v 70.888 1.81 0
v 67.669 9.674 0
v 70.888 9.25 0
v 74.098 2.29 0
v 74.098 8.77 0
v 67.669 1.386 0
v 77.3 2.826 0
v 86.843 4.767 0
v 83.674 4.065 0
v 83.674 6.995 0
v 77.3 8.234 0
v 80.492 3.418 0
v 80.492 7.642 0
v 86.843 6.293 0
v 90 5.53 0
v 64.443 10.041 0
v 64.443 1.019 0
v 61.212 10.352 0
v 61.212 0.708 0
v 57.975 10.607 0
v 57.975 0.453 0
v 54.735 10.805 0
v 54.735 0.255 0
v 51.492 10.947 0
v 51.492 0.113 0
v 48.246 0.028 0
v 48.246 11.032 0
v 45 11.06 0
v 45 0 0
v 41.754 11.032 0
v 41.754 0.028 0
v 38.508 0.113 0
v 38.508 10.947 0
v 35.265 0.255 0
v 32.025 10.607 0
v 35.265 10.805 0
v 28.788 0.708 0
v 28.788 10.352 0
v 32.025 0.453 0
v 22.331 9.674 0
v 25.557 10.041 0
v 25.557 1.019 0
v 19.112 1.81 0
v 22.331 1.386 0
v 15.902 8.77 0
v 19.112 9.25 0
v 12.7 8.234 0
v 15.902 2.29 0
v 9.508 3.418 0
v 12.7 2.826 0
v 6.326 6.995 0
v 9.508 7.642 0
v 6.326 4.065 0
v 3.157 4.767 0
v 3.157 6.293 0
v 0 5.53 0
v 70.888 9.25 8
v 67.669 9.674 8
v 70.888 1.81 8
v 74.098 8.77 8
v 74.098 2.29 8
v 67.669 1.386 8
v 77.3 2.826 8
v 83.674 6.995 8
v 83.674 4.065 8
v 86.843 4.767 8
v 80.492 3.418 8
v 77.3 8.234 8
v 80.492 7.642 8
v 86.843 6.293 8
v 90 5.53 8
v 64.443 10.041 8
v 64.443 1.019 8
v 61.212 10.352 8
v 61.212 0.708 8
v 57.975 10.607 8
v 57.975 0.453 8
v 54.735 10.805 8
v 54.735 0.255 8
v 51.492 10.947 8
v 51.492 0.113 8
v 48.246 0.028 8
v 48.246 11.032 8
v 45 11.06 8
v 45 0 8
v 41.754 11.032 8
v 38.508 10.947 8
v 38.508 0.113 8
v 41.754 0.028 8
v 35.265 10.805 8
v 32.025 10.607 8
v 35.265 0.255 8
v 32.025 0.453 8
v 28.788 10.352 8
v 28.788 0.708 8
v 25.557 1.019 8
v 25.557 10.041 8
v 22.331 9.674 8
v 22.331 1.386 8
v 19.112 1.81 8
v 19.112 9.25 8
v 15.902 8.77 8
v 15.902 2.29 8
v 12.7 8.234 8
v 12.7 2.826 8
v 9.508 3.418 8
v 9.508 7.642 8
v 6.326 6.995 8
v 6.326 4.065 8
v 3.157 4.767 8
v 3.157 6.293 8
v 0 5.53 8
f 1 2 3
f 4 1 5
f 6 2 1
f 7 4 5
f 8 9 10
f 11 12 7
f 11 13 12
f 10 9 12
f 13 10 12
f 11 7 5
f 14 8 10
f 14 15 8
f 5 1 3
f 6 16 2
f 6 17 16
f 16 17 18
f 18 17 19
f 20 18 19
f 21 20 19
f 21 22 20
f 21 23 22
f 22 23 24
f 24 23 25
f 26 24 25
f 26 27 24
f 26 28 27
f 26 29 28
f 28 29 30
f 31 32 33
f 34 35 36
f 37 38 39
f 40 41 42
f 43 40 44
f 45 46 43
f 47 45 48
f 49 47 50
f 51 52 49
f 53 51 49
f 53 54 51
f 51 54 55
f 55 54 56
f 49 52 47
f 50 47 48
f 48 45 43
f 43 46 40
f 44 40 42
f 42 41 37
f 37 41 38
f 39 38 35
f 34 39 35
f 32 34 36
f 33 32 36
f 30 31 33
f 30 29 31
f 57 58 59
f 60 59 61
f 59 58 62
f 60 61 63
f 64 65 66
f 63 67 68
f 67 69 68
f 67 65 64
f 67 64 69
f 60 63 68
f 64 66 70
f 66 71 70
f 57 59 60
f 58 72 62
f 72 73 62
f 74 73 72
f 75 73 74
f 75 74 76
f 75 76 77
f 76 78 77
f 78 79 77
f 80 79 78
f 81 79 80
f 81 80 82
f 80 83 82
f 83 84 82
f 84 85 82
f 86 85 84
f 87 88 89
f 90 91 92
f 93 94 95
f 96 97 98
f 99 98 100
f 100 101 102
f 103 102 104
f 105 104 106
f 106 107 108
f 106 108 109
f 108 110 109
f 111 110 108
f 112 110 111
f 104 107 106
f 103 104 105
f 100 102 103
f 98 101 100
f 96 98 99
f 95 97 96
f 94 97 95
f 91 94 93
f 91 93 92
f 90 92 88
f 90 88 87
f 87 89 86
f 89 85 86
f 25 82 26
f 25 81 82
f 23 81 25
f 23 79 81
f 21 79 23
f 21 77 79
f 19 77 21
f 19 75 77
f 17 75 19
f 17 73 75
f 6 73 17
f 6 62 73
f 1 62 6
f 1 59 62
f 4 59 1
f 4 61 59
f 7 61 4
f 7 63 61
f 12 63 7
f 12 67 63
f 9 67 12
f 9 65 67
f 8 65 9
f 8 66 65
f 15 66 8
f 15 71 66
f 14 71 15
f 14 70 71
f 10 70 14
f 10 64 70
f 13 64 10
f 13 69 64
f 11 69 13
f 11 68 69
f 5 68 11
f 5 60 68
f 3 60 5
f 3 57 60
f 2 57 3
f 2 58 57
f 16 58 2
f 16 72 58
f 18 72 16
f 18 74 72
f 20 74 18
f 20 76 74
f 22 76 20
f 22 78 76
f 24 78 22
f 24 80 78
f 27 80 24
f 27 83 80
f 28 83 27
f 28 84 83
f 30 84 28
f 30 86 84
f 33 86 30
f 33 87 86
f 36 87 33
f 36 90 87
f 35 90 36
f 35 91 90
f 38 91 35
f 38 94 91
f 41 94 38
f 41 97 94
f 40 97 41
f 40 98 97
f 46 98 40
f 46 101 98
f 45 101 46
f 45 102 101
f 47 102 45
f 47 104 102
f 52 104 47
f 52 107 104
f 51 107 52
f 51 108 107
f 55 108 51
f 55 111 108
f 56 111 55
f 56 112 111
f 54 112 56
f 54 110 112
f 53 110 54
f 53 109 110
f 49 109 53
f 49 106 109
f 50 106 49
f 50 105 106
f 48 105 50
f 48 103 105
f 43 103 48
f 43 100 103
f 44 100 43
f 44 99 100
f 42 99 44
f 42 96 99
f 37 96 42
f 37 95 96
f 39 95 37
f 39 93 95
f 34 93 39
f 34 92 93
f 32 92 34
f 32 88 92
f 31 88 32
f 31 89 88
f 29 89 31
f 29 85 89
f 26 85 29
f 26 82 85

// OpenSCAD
$fn = 32;

// ----------------------------------------------------------------------
// Arc profile plate: lens, 56 points
// ----------------------------------------------------------------------

// --- parameters (mm) ---
lens_chord = 90;          // chord length of the lens, X
arc_r = 186.01;           // radius of both arcs
arc_angle = 28;           // angle of each arc, degrees
sagitta = 5.53;           // bulge of each arc (half the lens height)
arc_step = 1;             // sampling step of the arcs, degrees
plate_t = 8;              // plate thickness, Z

bbox_y = 2 * sagitta;  // full lens height

profile = [[90, 5.53], [86.843, 6.293], [83.674, 6.995], [80.492, 7.642], [77.3, 8.234], [74.098, 8.77], [70.888, 9.25], [67.669, 9.674], [64.443, 10.041], [61.212, 10.352], [57.975, 10.607], [54.735, 10.805], [51.492, 10.947], [48.246, 11.032], [45, 11.06], [41.754, 11.032], [38.508, 10.947], [35.265, 10.805], [32.025, 10.607], [28.788, 10.352], [25.557, 10.041], [22.331, 9.674], [19.112, 9.25], [15.902, 8.77], [12.7, 8.234], [9.508, 7.642], [6.326, 6.995], [3.157, 6.293], [0, 5.53], [3.157, 4.767], [6.326, 4.065], [9.508, 3.418], [12.7, 2.826], [15.902, 2.29], [19.112, 1.81], [22.331, 1.386], [25.557, 1.019], [28.788, 0.708], [32.025, 0.453], [35.265, 0.255], [38.508, 0.113], [41.754, 0.028], [45, 0], [48.246, 0.028], [51.492, 0.113], [54.735, 0.255], [57.975, 0.453], [61.212, 0.708], [64.443, 1.019], [67.669, 1.386], [70.888, 1.81], [74.098, 2.29], [77.3, 2.826], [80.492, 3.418], [83.674, 4.065], [86.843, 4.767]];  // primary outline, 56 points, counter clockwise

// --- the one profile operation ---
linear_extrude(height = plate_t) polygon(points = profile);
